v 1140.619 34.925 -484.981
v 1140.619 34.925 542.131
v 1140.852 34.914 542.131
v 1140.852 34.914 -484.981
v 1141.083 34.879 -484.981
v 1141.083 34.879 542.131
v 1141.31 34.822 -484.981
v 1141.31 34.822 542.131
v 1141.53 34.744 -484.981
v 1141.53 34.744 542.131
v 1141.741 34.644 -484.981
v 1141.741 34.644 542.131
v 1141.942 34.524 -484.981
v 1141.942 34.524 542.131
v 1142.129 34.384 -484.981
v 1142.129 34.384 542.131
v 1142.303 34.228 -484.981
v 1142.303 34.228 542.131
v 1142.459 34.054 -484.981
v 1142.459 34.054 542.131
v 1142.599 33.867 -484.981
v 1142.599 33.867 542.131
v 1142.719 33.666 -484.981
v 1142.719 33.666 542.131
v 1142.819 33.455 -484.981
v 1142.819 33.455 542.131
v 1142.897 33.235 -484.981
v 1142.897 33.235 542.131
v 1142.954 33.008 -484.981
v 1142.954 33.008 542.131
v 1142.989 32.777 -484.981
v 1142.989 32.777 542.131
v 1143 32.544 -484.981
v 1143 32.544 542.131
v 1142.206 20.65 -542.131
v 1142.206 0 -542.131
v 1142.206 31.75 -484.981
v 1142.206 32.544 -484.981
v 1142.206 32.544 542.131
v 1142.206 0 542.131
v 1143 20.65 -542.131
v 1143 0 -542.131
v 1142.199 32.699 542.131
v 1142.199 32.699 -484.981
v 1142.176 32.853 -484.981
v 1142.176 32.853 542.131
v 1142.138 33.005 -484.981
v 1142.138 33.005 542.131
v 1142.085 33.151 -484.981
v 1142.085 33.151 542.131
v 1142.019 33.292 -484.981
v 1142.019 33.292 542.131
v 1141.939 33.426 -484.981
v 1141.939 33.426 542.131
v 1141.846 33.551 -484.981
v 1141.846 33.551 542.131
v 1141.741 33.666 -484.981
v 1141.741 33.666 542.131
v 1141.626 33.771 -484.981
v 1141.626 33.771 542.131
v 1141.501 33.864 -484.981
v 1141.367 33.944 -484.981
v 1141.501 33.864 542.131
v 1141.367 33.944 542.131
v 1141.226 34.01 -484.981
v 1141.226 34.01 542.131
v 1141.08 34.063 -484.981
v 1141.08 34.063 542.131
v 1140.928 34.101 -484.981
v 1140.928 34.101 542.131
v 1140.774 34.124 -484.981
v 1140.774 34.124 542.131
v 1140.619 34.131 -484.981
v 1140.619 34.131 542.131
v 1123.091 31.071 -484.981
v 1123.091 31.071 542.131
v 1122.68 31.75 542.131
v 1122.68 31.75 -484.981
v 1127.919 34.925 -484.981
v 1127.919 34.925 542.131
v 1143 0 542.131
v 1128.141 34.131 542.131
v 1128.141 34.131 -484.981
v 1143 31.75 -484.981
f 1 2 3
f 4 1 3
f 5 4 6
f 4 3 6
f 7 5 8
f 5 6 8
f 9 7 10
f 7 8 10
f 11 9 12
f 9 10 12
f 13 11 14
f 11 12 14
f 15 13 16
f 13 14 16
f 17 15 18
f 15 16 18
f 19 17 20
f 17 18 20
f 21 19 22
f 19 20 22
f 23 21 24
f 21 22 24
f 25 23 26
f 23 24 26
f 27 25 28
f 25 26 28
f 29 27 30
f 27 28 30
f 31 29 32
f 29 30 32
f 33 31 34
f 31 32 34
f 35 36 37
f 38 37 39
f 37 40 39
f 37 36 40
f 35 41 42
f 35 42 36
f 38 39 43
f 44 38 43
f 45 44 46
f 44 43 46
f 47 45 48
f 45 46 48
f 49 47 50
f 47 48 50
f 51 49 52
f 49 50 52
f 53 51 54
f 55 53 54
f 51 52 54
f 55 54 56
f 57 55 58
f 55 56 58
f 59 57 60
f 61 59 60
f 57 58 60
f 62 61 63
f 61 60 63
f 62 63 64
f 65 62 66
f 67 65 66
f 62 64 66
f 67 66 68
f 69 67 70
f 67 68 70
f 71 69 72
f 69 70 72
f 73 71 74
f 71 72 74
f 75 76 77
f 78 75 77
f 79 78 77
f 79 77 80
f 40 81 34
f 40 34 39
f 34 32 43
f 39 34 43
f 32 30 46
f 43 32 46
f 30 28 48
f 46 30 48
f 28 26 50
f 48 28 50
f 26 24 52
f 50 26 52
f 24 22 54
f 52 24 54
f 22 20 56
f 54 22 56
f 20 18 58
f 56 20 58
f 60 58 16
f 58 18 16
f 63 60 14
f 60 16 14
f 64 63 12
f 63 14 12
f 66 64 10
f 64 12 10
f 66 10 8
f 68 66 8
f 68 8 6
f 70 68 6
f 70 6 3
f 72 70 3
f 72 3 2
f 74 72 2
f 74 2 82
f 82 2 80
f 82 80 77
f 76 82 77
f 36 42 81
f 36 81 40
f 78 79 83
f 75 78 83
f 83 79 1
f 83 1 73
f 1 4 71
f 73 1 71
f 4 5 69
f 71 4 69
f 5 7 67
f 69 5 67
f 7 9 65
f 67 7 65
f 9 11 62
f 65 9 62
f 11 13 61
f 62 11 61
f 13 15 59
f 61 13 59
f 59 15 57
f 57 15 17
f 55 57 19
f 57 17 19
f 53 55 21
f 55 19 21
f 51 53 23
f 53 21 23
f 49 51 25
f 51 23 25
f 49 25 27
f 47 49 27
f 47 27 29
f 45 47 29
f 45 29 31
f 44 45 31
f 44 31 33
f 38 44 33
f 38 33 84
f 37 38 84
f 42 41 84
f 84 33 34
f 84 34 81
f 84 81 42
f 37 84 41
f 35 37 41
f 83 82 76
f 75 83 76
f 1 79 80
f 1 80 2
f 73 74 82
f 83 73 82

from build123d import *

# Parameters (mm, degrees)
EXTRUDE1_DEPTH     = 542.13125
CUT_EXTRUDE1_DEPTH = 25.4
CUT_EXTRUDE2_DEPTH = 25.4


with BuildPart() as part:
    # Sketch1 → Extrude1 (new body, symmetric)
    with BuildSketch(Plane.XY):
        with BuildLine():
            Line((1143, 0), (1142.20625, 0))
            Line((1142.20625, 0), (1142.20625, 32.54375))
            ThreePointArc((1142.20625, 32.54375), (1141.741282015, 33.666282015), (1140.61875, 34.13125))
            Line((1140.61875, 34.13125), (1128.140506397, 34.13125))
            Line((1128.140506397, 34.13125), (1123.091401986, 31.071186722))
            Line((1123.091401986, 31.071186722), (1122.68, 31.75))
            Line((1122.68, 31.75), (1127.91875, 34.925))
            Line((1127.91875, 34.925), (1140.61875, 34.925))
            ThreePointArc((1140.61875, 34.925), (1142.302548023, 34.227548023), (1143, 32.54375))
            Line((1143, 32.54375), (1143, 0))
        make_face()
    extrude(amount=EXTRUDE1_DEPTH, both=True)

    # Sketch2 → Cut-Extrude1 (cut)
    with BuildSketch(Plane(origin=(1143, 0, 0), x_dir=(0, 0, -1), z_dir=(1, 0, 0))):
        Polygon((542.13125, 34.925), (484.98125, 34.925), (484.98125, 31.75), (542.13125, 20.6502), align=None)
    extrude(amount=-CUT_EXTRUDE1_DEPTH, mode=Mode.SUBTRACT)

    # Sketch3 → Cut-Extrude2 (cut)
    with BuildSketch(Plane(origin=(0, 0, -484.98125), x_dir=(-1, 0, 0), z_dir=(0, 0, -1))):
        Polygon((-1127.91875, 34.925), (-1122.68, 31.75), (-1123.420434334, 30.528283348), (-1128.140506397, 34.13125), align=None)
    extrude(amount=CUT_EXTRUDE2_DEPTH, mode=Mode.SUBTRACT)


solid = part.part
